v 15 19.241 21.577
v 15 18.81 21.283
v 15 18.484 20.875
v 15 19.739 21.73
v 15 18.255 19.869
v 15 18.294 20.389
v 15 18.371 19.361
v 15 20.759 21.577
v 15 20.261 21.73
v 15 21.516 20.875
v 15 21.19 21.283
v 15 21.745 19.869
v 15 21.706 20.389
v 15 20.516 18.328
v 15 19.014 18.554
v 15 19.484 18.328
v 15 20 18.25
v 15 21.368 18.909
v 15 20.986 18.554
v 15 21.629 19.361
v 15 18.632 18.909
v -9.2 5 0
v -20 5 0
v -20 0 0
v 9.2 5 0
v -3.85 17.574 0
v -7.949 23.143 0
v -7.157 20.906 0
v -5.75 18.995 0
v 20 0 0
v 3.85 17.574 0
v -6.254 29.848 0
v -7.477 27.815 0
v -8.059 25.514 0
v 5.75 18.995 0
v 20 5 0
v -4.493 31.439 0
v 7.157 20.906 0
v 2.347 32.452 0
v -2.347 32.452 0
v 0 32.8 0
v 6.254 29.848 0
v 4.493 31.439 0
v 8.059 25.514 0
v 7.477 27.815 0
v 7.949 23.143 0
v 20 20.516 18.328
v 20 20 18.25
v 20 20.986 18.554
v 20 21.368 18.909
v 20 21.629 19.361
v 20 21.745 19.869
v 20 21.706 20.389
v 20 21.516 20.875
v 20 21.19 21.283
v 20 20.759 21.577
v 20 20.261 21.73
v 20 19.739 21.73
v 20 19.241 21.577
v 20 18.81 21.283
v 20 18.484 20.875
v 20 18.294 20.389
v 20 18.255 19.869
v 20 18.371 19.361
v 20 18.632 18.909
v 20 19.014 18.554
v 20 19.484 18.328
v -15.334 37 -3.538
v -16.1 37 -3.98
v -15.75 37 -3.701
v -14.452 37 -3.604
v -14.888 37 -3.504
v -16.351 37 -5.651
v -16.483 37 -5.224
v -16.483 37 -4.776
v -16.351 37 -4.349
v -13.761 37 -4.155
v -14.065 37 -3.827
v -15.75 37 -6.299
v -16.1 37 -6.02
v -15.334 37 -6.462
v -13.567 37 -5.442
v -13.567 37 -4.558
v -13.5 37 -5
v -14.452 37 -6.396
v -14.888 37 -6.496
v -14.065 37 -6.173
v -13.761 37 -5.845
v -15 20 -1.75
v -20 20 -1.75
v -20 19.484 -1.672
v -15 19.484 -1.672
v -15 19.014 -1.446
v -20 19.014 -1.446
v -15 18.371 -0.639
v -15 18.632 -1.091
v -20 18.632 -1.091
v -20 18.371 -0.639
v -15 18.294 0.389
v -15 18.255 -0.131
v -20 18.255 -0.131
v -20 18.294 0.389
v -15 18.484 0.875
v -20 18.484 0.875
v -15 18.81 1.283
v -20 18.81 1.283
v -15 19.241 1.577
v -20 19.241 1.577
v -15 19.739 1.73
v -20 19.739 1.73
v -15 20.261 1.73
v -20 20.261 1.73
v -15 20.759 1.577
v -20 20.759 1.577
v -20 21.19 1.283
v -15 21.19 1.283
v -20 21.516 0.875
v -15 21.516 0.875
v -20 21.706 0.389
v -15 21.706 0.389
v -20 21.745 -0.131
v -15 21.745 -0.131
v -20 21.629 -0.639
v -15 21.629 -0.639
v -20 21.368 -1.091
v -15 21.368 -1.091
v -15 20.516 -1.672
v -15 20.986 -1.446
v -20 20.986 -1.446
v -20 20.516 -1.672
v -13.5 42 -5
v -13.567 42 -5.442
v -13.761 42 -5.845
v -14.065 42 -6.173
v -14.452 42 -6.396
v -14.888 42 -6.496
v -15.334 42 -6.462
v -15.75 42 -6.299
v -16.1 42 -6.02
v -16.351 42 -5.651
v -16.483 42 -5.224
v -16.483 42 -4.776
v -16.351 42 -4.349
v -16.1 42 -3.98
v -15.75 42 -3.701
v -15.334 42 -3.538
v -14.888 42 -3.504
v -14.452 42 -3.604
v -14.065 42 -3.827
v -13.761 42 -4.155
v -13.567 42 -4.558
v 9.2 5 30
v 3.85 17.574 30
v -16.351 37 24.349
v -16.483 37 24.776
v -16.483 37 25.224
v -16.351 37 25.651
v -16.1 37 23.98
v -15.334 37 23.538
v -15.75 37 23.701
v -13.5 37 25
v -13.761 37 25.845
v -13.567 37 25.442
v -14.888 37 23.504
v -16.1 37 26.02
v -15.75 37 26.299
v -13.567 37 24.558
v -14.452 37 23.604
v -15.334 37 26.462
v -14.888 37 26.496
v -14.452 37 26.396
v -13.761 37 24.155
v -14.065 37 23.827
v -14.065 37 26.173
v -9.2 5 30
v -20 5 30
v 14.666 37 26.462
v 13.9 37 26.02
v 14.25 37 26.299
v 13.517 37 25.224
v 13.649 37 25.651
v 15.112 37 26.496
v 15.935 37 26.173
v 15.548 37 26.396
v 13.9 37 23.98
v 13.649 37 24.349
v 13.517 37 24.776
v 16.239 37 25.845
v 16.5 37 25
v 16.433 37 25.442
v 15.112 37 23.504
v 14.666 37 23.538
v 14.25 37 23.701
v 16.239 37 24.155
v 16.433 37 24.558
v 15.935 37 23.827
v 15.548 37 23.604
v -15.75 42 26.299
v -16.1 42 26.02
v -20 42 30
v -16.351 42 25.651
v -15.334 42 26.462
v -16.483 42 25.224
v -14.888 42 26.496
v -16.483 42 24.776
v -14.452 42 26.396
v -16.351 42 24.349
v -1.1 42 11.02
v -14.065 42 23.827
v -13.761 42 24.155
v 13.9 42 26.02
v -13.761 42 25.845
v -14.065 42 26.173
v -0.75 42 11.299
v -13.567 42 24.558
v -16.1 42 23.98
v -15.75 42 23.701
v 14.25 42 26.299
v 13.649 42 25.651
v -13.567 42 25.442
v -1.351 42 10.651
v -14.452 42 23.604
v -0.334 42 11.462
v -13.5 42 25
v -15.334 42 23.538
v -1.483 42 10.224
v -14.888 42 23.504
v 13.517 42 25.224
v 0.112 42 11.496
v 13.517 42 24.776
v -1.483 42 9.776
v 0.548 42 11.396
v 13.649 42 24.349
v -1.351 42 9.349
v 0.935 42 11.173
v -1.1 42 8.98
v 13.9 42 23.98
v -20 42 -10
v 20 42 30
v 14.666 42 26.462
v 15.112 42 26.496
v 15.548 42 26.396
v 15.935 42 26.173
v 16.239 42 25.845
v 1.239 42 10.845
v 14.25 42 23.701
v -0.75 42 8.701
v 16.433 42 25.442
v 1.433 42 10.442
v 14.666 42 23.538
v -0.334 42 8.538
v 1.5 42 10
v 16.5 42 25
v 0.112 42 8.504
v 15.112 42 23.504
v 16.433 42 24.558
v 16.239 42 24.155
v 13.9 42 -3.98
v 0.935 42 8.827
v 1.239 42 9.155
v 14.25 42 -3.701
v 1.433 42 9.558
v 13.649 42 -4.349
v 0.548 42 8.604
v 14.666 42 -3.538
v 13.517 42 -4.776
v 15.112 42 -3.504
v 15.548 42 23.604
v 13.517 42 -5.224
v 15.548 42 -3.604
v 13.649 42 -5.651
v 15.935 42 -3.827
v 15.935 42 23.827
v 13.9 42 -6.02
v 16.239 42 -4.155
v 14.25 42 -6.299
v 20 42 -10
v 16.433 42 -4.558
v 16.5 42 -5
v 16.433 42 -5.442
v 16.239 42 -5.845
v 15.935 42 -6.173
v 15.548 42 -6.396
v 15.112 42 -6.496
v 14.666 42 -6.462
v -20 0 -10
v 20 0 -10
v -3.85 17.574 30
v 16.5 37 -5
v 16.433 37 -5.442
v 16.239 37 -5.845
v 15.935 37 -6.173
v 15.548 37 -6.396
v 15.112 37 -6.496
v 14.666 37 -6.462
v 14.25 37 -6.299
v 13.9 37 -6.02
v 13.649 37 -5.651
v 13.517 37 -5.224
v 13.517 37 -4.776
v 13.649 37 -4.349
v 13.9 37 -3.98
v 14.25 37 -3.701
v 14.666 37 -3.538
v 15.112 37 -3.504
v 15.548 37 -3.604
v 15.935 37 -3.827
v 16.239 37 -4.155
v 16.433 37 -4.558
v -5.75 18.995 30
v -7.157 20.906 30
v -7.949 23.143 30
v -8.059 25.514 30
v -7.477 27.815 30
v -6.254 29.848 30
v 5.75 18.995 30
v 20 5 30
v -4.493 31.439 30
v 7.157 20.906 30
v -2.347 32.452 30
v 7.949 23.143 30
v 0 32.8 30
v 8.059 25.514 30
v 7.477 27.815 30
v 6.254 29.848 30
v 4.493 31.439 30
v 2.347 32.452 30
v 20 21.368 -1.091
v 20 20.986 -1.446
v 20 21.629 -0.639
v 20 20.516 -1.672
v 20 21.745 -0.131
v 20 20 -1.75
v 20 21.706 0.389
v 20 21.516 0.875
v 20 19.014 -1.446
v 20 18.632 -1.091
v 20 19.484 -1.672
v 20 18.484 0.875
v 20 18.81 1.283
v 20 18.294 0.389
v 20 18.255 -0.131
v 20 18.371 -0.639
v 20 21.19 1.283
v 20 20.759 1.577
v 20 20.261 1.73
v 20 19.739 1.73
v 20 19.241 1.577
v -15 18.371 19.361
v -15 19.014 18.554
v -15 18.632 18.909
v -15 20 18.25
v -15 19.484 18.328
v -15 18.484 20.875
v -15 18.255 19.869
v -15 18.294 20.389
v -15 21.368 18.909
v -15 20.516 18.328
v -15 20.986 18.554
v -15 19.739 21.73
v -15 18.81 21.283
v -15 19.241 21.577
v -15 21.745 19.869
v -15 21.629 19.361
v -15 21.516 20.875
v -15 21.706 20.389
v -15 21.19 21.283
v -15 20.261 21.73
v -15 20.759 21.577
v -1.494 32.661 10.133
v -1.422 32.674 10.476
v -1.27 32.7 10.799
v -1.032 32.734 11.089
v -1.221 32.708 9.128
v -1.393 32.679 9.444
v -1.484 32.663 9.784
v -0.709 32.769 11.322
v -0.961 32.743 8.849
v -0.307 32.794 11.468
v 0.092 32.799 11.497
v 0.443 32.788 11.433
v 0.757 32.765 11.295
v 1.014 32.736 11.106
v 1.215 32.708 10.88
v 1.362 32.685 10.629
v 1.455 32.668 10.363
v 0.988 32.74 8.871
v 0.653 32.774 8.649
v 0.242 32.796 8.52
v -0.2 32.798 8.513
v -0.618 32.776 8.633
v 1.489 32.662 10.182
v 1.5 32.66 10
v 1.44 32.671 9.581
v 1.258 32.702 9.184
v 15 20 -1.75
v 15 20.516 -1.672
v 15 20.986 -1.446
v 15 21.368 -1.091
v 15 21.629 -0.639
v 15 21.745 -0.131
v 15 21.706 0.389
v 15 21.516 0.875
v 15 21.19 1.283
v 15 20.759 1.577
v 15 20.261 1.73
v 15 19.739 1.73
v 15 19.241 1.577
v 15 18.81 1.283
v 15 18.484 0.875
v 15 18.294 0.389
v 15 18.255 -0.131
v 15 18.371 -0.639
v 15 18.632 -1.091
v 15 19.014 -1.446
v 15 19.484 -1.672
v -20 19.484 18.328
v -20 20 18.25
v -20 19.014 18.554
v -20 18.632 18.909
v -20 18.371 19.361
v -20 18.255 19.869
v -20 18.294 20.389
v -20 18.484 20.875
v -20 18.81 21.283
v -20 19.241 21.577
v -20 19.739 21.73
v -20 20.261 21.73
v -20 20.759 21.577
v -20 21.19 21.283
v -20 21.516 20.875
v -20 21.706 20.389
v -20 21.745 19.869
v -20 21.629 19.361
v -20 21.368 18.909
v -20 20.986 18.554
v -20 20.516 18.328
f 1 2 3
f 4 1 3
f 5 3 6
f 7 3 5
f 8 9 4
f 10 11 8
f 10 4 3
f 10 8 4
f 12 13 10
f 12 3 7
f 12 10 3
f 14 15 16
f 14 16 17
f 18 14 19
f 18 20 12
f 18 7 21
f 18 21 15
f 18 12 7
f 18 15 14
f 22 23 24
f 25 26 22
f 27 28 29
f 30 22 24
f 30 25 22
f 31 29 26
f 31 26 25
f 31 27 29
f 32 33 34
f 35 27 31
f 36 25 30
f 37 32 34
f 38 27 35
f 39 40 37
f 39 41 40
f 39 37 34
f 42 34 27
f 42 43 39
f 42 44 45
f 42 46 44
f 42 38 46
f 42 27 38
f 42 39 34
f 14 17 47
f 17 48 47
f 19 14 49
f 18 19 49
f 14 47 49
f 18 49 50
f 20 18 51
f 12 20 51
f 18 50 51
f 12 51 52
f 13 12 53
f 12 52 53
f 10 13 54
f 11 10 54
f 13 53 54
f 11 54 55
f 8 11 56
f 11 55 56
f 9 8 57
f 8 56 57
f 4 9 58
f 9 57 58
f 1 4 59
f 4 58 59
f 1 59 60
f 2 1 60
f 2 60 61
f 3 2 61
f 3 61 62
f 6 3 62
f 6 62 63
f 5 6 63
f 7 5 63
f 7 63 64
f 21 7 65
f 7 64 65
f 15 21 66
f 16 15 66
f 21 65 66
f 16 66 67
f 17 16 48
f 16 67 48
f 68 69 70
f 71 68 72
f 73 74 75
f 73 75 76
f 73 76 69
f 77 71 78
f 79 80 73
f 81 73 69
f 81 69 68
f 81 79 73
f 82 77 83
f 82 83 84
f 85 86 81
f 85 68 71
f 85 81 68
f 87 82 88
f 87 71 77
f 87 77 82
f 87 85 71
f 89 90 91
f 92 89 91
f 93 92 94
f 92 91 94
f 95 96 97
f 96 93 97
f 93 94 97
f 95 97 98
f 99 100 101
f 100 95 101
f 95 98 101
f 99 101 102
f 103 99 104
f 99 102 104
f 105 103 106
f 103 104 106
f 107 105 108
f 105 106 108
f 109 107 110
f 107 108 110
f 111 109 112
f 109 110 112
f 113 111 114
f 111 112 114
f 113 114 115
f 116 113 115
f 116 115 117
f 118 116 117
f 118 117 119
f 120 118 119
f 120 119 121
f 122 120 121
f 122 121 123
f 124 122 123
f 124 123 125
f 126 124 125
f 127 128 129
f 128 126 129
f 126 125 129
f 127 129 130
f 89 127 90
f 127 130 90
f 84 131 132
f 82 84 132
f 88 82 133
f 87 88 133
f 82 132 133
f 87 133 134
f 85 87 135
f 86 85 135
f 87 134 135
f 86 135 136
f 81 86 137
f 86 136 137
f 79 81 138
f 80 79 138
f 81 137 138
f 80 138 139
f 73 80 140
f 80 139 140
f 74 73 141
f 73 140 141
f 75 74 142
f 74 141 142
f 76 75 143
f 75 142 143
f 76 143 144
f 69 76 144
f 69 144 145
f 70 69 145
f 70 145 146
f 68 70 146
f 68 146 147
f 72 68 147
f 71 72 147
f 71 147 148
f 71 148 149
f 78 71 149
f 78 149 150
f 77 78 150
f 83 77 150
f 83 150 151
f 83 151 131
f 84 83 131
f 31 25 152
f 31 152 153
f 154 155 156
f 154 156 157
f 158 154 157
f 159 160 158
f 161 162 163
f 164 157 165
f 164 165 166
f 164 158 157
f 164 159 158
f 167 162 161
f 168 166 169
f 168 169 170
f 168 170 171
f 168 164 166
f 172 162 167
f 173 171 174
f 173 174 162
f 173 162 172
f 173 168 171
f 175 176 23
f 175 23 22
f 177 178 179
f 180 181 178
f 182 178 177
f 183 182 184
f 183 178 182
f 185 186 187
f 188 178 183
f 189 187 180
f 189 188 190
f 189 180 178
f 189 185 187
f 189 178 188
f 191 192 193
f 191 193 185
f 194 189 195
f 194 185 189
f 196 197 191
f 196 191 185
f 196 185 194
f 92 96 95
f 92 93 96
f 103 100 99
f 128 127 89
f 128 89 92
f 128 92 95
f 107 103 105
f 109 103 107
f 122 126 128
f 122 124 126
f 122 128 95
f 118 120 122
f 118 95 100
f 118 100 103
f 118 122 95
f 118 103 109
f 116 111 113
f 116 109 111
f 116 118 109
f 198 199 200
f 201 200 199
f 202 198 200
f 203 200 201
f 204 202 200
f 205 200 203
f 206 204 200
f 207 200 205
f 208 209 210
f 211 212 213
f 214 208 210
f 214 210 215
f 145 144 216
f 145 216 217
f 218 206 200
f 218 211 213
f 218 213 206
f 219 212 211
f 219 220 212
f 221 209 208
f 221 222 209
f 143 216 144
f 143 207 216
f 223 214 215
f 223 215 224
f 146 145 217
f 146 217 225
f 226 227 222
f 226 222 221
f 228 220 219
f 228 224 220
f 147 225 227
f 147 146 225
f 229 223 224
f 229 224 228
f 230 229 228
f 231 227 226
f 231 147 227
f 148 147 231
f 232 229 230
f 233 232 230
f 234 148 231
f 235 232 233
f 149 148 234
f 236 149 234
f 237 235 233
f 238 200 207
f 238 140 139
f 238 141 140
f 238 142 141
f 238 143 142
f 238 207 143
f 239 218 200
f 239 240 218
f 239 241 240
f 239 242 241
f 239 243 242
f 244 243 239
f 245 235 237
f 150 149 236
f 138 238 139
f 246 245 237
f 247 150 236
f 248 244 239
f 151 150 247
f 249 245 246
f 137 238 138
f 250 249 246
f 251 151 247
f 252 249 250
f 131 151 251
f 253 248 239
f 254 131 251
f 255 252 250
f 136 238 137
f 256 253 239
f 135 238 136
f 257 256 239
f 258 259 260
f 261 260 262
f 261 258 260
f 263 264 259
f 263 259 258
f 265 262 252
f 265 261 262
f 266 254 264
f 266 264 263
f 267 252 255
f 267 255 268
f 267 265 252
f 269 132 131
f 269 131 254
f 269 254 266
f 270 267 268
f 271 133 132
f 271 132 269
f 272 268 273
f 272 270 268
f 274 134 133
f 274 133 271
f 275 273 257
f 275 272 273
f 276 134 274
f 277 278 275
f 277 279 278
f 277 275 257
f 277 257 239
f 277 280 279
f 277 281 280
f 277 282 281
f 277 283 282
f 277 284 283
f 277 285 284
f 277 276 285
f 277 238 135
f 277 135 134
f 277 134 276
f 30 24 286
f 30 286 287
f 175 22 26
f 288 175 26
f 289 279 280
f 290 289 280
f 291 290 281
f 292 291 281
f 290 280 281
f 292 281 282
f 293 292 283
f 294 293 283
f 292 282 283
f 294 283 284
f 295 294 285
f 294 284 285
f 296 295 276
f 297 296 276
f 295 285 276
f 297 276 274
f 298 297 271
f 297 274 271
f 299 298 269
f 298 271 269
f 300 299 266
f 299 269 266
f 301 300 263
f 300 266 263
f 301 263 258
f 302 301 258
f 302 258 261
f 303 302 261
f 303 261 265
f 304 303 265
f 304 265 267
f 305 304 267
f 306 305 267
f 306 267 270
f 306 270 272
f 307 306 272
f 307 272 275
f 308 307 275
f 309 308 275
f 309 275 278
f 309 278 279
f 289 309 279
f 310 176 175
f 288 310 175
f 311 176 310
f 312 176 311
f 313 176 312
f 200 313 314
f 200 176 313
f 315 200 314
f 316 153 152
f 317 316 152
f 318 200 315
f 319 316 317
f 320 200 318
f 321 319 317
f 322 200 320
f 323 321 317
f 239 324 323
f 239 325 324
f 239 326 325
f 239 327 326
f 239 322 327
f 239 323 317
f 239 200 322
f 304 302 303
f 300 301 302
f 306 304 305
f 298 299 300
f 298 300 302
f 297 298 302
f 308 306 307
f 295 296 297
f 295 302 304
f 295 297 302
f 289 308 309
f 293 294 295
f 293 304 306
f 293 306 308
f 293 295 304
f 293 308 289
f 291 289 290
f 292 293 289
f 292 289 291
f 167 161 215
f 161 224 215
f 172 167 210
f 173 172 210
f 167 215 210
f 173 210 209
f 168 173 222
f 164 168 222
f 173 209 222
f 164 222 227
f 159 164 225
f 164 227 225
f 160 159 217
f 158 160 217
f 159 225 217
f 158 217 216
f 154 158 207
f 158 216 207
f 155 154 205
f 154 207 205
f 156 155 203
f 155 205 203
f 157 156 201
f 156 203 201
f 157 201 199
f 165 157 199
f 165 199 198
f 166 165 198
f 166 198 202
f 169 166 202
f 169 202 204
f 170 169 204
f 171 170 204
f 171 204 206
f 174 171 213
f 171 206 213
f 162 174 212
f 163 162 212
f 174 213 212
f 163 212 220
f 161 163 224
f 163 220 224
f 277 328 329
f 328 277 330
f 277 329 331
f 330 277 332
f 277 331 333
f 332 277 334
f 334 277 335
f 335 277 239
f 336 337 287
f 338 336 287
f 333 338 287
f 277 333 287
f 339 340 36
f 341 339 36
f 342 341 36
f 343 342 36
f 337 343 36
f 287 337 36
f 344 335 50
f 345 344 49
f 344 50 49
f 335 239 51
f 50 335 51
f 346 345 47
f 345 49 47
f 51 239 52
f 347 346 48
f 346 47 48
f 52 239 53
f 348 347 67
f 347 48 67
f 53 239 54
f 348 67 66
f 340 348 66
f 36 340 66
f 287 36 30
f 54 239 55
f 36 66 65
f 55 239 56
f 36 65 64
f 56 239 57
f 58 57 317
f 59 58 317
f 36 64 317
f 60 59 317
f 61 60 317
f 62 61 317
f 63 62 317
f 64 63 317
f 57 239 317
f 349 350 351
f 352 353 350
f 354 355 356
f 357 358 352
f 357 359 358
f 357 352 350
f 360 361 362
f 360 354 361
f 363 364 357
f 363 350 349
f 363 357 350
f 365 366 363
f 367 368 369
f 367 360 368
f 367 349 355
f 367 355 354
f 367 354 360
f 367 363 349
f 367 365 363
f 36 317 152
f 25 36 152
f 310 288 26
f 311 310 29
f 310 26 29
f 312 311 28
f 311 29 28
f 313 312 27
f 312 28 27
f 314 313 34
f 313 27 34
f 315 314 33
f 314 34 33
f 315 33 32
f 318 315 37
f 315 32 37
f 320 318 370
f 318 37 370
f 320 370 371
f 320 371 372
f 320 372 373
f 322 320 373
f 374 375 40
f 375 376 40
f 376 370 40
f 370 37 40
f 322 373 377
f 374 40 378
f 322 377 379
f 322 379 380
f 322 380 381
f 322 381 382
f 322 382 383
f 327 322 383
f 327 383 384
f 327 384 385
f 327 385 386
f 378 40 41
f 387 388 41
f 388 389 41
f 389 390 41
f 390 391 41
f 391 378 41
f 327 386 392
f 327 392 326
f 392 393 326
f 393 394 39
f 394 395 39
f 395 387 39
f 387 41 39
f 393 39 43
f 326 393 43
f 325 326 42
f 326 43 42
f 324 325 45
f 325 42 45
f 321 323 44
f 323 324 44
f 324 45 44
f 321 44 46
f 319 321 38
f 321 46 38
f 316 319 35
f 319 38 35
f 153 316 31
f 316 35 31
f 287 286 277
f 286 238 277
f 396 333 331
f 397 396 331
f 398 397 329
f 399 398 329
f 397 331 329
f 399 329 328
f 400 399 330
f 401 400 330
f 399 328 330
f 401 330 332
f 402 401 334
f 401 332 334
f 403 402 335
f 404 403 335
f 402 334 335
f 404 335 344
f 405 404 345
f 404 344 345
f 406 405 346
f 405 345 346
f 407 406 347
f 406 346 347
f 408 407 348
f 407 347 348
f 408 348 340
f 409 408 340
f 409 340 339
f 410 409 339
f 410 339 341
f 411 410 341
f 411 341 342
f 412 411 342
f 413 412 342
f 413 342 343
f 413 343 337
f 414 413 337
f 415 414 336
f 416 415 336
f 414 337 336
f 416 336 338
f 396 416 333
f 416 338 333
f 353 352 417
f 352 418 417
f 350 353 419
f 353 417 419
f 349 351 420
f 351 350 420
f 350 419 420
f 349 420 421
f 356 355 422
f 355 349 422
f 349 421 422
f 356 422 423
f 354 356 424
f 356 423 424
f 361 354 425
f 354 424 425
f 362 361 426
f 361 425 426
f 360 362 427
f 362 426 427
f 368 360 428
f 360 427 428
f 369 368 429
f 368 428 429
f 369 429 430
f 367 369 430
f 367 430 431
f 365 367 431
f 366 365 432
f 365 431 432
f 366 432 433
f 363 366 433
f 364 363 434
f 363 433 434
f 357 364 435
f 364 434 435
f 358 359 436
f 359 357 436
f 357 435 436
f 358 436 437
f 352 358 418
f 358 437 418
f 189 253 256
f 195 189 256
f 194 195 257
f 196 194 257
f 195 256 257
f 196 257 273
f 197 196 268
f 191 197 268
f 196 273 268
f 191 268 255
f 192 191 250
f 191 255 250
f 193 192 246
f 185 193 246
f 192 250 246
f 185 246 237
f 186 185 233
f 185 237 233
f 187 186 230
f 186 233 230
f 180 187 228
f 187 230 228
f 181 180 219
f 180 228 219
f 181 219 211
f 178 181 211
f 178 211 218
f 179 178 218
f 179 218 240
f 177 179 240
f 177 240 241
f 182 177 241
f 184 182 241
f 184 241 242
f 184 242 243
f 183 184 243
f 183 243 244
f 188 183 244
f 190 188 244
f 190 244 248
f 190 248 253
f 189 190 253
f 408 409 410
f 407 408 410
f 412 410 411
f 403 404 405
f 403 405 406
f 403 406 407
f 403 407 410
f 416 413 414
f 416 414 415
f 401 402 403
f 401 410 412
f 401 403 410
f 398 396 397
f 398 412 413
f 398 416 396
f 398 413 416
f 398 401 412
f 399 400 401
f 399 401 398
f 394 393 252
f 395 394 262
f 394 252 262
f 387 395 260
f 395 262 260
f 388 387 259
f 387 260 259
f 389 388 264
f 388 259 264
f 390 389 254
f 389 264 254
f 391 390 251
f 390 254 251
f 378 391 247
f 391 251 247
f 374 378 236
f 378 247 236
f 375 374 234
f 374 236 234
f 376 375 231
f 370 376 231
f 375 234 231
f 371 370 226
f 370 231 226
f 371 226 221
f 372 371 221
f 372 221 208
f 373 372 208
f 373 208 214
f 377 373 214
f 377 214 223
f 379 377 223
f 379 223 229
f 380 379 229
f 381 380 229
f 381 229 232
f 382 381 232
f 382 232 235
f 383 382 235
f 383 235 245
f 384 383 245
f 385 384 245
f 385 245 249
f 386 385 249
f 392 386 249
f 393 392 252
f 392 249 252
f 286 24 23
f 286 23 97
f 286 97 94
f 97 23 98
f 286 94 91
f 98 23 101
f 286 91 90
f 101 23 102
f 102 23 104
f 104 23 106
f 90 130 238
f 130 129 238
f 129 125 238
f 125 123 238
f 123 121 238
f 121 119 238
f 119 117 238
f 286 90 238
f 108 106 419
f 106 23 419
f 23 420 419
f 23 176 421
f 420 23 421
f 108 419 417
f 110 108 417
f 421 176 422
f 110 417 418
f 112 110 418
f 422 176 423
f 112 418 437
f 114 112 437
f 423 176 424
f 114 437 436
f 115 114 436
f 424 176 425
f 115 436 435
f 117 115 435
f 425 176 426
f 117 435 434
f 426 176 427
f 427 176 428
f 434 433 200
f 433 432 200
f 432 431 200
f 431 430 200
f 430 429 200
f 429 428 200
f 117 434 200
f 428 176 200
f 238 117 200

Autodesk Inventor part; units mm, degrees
ref_plane "YZ Plane" through (0, 0, 0) normal (1, 0, 0) x (0, 1, 0)
ref_plane "XZ Plane" through (0, 0, 0) normal (0, 1, 0) x (-1, 0, 0)
ref_plane "XY Plane" through (0, 0, 0) normal (0, 0, 1) x (1, 0, 0)
sketch "Sketch1" plane through (0, 0, 0) normal (0, 0, 1) x (1, 0, 0)
  circle A0 centre (0, 24.7) radius 8.1
  line L0 (0, 24.7) -> (0, 0) construction
  line L1 (0, 0) -> (-20, 0) construction
  line L2 (-20, 5) -> (-9.2, 5)
  line L3 (-9.2, 5) -> (-3.85, 17.5735)
  line L4 (0, 0) -> (20, 0) construction
  line L5 (20, 0) -> (20, 5) construction
  line L6 (20, 5) -> (9.2, 5)
  line L7 (9.2, 5) -> (3.85, 17.5735)
  line L8 (0, 24.7) -> (0, 32.8) construction
  line L9 (-3.85, 17.5735) -> (3.85, 17.5735) construction
  line L10 (-20, 5) -> (-20, 42)
  line L11 (-20, 42) -> (20, 42)
  line L12 (20, 42) -> (20, 5)
  line L13 (-20, 5) -> (-20, 0)
  line L14 (-20, 0) -> (20, 0)
  line L15 (20, 0) -> (20, 5)
  line L16 (-9.2, 5) -> (9.2, 5)
  point P0 (0, 42)
  point P1 (-20, 5)
  dimension "d0" = 16.2
  dimension "d2" = 5
  dimension "d5" = 7.7
  dimension "d91" = 42
  dimension "d102" = 19.7
  dimension "d103" = 18.4
  dimension "d104" = 40
extrude "Extrusion1" add sketch "Sketch1" along normal blind 30 contours A0 L3 L2 L10 L11 L12 L6 L7
extrude "Extrusion2" add sketch "Sketch1" against normal blind 10
sketch "Sketch6" plane through (-20, 42, 30) normal (0, 1, 0) x (1, 0, 0)
  line L0 (0, 40) -> (0, 0) projected
  line L1 (40, 0) -> (0, 0) projected
  line L2 (0, 40) -> (40, 0) construction
  line L3 (40, 40) -> (0, 0) construction
  circle A0 centre (35, 5) radius 1.5
  circle A1 centre (5, 5) radius 1.5
  circle A2 centre (5, 35) radius 1.5
  circle A3 centre (35, 35) radius 1.5
  line L4 (35, 35) -> (35, 5) construction
  line L5 (5, 5) -> (35, 5) construction
  line L6 (5, 5) -> (5, 35) construction
  circle A4 centre (20, 20) radius 1.5
  line L7 (40, 40) -> (40, 0) projected
  line L8 (0, 40) -> (40, 40) projected
  point P0 (20, 30)
  dimension "d69" = 30
  dimension "d70" = 3
  dimension "d73" = 3
extrude "Extrusion8" cut sketch "Sketch6" against normal blind 5 contours A0 | A1 | A2 | A3
extrude "Extrusion9" cut sketch "Sketch6" against normal through all contours A4
sketch "Sketch8" plane through (20, 5, 30) normal (1, 0, 0) x (0, 0, -1)
  line L0 (0, 0) -> (0, 37) projected
  line L1 (30, 0) -> (0, 0) projected
  line L2 (20, 37) -> (20, 15) construction
  line L3 (20, 15) -> (10, 15) construction
  line L4 (20, 15) -> (30, 15) construction
  circle A0 centre (10, 15) radius 1.75
  circle A1 centre (30, 15) radius 1.75
  line L5 (40, 37) -> (0, 37) projected
  line L6 (30, -5) -> (30, 0) projected
  line L7 (30, -5) -> (40, -5) projected
  line L8 (40, 37) -> (40, -5) projected
  point P0 (30, -5)
  point P1 (35, -5)
  dimension "d97" = 3.5
  dimension "d98" = 3.5
  dimension "d105" = 20
  dimension "d106" = 20
  dimension "d107" = 20
extrude "Extrusion12" cut sketch "Sketch8" against normal blind 5 contours A0 | A1
mirror "Mirror1" about plane through (0, 0, 0) normal (1, 0, 0) of "Extrusion12"
properties part number "X Axis End_3DPrint"
